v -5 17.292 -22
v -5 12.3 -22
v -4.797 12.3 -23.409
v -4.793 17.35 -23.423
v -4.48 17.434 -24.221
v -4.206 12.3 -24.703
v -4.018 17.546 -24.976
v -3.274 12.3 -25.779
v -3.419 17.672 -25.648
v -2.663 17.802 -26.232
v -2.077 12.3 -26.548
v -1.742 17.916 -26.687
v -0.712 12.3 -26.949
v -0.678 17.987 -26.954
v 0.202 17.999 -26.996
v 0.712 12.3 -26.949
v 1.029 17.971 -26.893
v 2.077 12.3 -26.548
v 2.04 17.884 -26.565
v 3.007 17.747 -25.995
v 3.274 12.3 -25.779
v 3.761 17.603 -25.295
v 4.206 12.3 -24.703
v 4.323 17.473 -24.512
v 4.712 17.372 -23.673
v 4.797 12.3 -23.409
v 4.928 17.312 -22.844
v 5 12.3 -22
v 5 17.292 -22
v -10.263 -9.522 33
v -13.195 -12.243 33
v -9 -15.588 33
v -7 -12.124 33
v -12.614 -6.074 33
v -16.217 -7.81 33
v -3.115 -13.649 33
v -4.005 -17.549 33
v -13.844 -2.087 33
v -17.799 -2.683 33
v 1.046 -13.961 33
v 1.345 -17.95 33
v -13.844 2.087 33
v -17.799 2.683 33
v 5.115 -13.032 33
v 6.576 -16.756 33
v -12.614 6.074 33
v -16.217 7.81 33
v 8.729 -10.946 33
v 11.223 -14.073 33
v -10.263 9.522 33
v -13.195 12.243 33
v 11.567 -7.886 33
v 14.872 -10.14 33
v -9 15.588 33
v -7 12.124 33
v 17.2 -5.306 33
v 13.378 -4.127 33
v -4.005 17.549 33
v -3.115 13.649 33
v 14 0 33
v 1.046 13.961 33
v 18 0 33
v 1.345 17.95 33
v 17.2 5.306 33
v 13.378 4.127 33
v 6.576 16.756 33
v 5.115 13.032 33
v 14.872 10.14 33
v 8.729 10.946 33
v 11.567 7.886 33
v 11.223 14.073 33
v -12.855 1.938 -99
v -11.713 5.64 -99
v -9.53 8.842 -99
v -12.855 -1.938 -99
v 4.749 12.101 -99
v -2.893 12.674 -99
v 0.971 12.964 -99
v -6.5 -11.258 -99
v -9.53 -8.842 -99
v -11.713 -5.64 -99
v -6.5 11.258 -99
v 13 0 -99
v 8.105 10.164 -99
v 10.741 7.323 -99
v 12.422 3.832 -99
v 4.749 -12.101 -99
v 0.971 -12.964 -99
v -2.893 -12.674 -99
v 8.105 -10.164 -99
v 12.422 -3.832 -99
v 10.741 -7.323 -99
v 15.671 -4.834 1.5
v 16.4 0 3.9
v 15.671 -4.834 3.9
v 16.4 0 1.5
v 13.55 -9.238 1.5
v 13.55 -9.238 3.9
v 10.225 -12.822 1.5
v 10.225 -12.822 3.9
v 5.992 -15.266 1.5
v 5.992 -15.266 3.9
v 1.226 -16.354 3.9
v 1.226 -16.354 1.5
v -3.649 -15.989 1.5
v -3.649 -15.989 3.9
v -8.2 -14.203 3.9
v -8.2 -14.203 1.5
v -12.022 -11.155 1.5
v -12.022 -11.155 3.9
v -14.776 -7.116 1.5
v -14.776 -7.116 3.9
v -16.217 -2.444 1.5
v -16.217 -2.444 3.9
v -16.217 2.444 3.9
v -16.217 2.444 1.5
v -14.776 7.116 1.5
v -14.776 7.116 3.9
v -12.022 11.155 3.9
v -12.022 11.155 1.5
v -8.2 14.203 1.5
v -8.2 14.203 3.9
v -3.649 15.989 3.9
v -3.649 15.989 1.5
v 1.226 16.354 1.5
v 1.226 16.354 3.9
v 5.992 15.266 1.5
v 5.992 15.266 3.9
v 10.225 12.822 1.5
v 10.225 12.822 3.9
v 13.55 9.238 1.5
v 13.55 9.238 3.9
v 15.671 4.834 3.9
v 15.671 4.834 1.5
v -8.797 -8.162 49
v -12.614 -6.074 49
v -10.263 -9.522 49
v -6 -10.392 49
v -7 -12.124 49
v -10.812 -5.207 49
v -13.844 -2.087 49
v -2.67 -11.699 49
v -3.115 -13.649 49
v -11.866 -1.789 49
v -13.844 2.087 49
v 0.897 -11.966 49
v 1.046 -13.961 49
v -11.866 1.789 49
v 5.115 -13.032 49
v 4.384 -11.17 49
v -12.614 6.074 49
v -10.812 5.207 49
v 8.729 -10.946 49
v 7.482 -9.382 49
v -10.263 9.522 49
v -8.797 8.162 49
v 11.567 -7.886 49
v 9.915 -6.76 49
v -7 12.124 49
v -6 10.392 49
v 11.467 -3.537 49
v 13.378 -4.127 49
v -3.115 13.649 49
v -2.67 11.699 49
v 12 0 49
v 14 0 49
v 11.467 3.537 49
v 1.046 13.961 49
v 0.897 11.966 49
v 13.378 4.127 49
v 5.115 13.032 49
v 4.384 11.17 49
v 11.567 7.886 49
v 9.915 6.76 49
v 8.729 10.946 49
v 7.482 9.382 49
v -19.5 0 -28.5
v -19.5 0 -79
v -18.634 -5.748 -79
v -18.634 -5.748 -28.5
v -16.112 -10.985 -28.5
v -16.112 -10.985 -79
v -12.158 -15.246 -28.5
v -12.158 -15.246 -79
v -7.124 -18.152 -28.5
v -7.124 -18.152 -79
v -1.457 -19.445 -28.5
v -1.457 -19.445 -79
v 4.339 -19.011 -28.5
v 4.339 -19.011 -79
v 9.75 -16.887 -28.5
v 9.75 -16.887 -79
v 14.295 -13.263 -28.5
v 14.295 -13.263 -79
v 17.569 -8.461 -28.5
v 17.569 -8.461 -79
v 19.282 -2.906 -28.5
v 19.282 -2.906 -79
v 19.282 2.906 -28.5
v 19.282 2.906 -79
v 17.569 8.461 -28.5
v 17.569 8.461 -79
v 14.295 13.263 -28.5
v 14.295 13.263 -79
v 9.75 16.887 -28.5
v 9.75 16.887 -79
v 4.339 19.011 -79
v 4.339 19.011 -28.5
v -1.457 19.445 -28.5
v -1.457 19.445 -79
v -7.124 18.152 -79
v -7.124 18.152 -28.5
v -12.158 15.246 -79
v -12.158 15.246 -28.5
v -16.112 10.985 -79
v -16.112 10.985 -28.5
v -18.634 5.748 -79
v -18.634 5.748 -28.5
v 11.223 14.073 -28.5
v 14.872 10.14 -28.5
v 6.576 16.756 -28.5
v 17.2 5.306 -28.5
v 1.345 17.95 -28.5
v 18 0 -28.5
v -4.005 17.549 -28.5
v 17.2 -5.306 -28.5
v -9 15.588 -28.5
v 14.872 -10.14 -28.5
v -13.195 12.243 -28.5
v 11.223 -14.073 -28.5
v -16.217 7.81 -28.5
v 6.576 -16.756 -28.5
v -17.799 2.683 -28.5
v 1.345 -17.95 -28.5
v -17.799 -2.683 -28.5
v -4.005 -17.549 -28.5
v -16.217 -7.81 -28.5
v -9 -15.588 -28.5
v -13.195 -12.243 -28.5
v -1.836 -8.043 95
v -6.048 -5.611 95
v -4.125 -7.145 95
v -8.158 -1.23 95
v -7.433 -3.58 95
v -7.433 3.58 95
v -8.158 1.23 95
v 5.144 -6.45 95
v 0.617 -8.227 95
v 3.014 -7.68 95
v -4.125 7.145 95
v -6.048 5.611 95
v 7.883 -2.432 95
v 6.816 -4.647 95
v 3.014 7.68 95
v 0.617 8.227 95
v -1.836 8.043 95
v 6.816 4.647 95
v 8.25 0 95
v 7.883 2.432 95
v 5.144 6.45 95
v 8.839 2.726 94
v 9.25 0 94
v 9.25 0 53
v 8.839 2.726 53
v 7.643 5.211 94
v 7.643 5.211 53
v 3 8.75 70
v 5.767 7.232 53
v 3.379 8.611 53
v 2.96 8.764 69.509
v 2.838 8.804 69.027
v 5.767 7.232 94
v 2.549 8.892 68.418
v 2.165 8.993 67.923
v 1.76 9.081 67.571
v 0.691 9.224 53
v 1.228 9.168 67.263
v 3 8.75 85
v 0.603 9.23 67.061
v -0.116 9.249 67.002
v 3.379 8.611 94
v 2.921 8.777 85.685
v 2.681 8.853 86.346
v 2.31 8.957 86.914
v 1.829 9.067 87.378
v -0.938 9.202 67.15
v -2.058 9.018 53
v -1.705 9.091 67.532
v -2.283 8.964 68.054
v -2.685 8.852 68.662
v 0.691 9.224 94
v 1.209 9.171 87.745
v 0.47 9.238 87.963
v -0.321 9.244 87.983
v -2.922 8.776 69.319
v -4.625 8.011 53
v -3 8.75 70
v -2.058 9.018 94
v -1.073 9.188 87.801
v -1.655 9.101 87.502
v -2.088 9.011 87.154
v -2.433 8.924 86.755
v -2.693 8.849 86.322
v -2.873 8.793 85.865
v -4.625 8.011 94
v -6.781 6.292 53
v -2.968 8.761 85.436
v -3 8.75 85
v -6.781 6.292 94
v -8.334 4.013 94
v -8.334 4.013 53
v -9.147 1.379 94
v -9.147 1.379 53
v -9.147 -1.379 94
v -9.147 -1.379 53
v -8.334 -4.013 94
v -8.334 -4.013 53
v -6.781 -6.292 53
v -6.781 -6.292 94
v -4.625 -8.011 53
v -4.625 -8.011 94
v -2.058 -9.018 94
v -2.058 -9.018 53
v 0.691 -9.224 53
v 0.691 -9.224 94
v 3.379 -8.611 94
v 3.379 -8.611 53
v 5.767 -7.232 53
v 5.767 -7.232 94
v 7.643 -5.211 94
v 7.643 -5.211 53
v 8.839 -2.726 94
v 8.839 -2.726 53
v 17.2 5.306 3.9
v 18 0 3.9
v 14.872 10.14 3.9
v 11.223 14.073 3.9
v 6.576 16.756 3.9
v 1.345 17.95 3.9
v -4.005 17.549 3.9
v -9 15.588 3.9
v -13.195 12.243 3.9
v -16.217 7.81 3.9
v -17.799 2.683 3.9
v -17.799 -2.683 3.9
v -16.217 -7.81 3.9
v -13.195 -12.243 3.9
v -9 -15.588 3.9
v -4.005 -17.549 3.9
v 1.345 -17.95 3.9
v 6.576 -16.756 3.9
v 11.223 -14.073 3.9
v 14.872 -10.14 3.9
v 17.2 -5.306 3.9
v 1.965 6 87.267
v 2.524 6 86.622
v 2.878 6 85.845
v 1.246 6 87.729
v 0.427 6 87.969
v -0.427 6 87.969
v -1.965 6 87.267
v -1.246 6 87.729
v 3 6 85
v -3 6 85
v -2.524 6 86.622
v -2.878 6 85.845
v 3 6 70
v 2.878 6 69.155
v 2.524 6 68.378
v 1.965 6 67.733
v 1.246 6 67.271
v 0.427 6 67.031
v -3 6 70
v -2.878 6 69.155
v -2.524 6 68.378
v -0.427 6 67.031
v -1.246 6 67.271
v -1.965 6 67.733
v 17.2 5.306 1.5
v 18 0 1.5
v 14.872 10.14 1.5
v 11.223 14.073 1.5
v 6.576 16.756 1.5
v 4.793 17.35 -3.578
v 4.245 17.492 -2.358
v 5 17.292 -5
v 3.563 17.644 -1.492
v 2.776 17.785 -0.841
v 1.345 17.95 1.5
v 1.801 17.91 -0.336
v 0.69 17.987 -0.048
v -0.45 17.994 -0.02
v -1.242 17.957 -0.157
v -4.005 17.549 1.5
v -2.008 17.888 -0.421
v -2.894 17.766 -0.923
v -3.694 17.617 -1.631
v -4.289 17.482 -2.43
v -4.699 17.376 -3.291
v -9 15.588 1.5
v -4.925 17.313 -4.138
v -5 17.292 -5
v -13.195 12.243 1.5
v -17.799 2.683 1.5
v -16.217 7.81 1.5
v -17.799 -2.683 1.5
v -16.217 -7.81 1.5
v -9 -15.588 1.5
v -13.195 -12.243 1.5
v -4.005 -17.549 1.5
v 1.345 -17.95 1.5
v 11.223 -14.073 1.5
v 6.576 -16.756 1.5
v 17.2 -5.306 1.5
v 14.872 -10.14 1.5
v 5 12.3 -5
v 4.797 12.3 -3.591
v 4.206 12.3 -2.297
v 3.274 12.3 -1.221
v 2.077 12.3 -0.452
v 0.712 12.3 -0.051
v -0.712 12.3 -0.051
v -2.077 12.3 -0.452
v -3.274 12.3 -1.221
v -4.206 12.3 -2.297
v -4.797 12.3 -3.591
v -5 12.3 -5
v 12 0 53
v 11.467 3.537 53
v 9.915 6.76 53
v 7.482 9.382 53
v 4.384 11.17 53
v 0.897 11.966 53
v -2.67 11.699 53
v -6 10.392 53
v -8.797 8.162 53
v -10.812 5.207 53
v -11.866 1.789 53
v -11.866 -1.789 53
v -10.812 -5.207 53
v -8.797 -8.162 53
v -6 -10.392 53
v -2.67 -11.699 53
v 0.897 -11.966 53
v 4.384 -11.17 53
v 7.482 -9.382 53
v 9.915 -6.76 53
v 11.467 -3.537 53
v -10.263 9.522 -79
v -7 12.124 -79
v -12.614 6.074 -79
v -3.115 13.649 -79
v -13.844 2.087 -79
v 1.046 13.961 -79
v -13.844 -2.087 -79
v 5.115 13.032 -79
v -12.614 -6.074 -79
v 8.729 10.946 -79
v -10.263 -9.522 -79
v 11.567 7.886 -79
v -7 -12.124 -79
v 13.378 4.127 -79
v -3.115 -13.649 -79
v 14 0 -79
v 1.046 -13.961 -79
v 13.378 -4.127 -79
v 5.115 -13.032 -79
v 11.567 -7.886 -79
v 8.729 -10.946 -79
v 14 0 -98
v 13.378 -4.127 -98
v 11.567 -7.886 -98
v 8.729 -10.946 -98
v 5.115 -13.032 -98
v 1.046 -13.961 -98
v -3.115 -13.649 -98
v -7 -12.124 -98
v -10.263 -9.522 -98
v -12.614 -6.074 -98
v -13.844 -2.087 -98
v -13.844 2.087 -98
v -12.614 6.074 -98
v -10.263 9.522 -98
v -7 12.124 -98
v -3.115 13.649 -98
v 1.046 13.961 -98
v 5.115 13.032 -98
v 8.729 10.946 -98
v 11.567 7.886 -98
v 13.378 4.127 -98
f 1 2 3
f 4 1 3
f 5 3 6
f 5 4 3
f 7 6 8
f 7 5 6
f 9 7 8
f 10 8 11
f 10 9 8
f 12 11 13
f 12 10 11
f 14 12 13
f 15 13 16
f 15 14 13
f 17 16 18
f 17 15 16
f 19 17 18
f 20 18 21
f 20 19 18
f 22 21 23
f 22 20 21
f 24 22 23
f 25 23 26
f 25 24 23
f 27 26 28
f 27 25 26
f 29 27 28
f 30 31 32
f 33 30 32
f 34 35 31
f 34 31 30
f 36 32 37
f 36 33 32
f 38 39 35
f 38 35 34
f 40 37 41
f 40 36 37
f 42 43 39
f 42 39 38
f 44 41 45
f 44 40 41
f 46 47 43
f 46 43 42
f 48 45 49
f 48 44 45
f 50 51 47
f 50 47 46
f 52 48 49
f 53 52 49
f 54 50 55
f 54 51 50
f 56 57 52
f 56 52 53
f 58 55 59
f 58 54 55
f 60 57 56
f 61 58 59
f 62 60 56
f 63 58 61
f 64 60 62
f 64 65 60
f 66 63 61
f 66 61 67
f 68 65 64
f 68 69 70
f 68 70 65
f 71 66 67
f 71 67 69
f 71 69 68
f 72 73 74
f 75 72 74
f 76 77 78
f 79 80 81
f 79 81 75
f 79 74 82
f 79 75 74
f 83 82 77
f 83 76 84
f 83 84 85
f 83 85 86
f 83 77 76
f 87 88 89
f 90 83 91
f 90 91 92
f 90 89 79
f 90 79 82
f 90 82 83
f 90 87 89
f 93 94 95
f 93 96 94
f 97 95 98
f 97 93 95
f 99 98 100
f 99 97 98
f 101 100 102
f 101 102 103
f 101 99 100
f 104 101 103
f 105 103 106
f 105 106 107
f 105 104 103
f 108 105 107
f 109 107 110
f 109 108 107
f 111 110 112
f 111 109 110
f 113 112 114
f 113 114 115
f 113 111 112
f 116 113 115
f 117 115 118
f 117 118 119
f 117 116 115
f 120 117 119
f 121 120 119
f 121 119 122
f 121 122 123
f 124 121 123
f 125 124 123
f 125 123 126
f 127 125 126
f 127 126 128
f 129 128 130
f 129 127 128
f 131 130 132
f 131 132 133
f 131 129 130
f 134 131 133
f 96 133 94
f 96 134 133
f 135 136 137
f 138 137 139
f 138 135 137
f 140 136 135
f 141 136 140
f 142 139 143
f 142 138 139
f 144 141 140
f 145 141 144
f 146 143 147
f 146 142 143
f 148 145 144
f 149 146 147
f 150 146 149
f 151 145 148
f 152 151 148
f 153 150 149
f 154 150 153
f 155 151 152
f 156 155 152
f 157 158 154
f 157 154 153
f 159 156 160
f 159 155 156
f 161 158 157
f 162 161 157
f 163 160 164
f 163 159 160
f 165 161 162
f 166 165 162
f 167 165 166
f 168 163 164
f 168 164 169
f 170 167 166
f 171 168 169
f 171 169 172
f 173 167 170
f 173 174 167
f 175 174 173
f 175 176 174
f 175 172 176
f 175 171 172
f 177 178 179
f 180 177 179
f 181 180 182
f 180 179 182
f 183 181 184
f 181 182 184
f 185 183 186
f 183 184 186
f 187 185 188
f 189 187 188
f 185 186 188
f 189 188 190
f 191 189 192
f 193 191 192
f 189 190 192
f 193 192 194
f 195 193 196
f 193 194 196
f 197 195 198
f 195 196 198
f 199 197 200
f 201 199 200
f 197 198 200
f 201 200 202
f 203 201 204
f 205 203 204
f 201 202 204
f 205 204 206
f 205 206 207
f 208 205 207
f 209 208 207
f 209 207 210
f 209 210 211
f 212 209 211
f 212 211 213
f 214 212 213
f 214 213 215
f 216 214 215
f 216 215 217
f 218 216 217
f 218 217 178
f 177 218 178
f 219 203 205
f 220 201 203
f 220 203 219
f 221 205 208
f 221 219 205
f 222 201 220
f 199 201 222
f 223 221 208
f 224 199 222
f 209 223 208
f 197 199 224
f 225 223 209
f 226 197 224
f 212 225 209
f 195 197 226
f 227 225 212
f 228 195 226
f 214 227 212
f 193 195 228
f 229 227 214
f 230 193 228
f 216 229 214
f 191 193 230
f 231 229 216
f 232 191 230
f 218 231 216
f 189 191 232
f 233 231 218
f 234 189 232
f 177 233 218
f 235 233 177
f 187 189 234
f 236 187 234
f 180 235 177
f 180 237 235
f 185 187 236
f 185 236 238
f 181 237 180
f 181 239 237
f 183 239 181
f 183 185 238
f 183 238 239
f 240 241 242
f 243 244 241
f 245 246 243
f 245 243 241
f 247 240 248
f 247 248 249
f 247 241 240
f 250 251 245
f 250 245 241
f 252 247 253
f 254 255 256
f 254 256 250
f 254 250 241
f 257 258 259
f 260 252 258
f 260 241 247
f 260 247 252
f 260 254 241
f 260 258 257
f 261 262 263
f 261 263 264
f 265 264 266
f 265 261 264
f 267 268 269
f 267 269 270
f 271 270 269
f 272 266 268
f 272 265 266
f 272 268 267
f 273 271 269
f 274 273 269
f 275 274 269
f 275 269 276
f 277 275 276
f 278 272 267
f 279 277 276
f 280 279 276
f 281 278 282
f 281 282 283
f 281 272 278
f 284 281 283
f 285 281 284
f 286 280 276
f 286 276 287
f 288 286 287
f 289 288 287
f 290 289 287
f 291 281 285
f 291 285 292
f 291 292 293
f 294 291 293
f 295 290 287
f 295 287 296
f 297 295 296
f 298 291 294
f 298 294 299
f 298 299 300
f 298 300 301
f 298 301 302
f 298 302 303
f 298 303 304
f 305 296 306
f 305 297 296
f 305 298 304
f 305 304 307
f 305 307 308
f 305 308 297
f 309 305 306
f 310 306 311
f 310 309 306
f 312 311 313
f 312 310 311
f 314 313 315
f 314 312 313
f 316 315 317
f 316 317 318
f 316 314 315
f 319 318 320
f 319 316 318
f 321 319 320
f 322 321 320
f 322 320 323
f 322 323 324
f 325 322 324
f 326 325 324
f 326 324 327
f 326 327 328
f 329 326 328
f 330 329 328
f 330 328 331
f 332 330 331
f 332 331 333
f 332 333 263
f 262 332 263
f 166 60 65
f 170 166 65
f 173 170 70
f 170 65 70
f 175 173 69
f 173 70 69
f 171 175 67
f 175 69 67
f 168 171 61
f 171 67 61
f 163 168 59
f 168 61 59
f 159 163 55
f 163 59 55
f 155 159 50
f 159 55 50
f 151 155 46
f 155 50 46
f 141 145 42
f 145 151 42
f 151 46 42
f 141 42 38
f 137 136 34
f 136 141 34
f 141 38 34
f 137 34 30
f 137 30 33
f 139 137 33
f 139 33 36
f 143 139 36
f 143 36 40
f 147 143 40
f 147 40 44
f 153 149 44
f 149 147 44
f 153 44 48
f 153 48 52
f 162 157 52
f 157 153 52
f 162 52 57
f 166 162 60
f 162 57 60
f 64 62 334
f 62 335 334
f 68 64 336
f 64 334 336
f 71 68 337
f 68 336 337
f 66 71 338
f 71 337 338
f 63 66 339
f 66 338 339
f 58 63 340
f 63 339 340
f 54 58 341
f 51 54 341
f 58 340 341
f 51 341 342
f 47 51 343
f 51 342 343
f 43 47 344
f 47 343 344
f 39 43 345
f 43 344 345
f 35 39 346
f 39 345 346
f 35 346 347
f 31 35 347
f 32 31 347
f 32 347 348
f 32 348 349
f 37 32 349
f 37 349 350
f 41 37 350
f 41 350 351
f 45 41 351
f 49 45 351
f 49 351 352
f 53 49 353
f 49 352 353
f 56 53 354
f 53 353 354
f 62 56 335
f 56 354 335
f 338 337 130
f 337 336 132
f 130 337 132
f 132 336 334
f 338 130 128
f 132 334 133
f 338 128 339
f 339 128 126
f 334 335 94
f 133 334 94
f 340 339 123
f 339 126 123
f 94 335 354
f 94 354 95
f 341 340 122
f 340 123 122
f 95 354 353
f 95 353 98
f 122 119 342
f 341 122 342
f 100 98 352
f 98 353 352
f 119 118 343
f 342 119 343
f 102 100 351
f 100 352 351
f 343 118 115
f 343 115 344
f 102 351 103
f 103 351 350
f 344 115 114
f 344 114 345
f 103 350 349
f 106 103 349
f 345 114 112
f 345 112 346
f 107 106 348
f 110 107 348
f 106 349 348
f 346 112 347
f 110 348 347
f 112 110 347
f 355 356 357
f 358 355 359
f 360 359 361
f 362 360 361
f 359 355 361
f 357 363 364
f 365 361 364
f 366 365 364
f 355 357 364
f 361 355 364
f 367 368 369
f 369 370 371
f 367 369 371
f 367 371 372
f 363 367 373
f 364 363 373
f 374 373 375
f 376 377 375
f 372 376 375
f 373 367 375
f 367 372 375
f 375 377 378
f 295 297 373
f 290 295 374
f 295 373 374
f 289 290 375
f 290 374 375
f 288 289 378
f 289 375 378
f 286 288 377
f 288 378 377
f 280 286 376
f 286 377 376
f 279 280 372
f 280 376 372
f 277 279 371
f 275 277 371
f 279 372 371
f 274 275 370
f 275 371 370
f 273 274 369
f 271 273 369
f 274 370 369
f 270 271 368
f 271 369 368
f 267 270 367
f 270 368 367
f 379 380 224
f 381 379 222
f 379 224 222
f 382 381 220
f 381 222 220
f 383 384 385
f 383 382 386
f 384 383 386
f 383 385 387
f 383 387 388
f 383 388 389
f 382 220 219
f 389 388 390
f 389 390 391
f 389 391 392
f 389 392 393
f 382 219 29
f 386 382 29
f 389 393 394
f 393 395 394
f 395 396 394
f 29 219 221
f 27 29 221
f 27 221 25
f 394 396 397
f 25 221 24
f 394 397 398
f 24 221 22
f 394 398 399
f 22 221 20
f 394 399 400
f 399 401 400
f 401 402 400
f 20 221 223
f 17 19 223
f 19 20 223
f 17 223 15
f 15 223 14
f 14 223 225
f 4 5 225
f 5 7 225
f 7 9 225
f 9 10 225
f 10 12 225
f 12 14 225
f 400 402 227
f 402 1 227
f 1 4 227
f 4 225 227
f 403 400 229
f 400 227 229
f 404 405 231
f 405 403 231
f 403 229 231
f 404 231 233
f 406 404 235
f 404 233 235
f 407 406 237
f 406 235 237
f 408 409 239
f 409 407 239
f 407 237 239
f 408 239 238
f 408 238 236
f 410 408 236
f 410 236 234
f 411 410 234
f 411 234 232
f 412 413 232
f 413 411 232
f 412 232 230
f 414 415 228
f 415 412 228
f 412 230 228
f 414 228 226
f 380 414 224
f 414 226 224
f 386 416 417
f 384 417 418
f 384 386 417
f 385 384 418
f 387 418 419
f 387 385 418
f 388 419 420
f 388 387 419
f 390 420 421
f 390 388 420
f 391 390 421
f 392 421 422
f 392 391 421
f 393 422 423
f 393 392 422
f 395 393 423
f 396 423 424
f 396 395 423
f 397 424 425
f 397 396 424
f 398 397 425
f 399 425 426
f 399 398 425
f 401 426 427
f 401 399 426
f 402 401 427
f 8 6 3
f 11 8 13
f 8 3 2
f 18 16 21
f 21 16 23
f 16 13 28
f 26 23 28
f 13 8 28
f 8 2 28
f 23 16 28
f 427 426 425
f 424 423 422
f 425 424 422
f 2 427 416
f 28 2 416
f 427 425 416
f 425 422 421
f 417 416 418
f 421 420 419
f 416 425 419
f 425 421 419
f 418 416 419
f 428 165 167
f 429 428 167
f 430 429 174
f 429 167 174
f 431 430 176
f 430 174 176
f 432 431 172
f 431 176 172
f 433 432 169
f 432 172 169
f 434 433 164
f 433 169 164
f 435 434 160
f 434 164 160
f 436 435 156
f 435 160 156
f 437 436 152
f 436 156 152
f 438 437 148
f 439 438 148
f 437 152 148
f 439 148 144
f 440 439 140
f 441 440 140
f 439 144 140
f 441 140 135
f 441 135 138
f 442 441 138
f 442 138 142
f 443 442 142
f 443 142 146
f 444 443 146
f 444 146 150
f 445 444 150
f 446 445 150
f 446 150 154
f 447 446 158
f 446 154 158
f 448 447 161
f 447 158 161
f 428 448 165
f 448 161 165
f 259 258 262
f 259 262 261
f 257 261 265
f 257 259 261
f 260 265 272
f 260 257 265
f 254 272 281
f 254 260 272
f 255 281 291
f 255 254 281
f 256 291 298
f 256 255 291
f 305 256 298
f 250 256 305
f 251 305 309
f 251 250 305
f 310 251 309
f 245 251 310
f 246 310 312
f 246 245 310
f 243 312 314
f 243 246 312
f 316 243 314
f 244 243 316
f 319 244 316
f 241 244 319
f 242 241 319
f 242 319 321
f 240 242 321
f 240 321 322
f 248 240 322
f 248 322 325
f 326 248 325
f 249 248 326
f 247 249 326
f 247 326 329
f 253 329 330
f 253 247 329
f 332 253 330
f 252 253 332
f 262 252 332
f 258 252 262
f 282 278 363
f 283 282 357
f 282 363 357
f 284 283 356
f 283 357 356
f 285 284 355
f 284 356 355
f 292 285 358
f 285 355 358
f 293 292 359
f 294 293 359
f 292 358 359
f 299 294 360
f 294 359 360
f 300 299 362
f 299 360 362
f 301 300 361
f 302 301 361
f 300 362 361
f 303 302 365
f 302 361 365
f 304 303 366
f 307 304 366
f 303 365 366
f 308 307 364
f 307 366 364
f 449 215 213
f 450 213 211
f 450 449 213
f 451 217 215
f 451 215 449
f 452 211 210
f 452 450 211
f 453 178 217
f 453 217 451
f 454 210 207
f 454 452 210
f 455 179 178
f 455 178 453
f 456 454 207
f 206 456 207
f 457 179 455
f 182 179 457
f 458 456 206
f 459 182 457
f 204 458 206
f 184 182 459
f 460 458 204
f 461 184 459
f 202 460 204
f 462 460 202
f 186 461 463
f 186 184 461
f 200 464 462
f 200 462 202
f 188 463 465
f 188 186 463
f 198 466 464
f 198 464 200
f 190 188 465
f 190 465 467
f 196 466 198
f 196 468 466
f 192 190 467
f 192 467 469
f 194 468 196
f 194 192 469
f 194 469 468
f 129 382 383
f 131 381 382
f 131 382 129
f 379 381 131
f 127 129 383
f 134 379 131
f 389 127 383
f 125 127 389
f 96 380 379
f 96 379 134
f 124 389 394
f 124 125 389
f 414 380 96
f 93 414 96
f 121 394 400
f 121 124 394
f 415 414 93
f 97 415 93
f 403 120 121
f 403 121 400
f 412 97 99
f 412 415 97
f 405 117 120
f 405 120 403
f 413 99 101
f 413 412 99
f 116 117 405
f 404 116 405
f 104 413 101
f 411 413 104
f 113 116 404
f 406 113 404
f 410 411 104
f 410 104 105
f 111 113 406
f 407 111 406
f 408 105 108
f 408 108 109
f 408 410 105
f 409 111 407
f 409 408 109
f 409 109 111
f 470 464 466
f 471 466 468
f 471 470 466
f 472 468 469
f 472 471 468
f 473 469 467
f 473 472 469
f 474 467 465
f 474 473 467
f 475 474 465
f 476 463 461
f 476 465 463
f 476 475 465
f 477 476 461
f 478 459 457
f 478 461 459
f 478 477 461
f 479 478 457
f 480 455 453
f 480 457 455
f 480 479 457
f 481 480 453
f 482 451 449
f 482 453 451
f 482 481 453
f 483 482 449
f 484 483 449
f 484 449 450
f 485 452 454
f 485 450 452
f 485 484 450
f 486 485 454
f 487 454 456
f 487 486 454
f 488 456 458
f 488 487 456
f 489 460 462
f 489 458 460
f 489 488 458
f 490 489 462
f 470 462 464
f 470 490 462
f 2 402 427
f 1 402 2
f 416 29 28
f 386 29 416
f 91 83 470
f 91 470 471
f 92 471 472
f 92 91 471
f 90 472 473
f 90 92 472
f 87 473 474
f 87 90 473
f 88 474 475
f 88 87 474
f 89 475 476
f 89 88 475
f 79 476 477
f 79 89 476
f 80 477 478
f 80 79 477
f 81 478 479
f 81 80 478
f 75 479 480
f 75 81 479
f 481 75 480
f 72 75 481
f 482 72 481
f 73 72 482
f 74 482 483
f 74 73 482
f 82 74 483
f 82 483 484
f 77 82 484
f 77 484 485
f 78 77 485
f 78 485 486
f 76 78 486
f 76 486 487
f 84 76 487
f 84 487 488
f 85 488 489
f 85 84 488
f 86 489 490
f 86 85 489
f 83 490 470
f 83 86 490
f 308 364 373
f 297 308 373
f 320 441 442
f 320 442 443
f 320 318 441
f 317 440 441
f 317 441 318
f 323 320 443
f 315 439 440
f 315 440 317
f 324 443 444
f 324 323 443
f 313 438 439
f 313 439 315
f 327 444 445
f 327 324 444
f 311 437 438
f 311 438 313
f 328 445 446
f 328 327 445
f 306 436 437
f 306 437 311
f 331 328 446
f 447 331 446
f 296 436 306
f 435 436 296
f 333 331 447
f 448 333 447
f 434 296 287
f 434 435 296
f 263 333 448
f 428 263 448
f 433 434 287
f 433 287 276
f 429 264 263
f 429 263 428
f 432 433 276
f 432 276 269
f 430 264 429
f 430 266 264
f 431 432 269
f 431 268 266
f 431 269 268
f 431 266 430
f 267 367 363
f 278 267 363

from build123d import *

# Parameters (mm, degrees)
BOSS_EXTRUDE1_DEPTH      = 5
BOSS_EXTRUDE1_DEPTH_BACK = 34
SKETCH1_R                = 18
SKETCH2_R                = 14
BOSS_EXTRUDE2_DEPTH      = 50
BOSS_EXTRUDE3_START      = 80
SKETCH3_R                = 14
BOSS_EXTRUDE3_DEPTH      = 80
CUT_EXTRUDE2_DEPTH       = 9
SKETCH6_R                = 19.5
SKETCH6_R_2              = 18
BOSS_EXTRUDE4_DEPTH      = 4
SKETCH10_R               = 19.5
SKETCH10_R_2             = 18
BOSS_EXTRUDE6_DEPTH      = 1.5
SKETCH12_W               = 2.4
SKETCH12_H               = 5.371583629
SKETCH13_R               = 18
BOSS_EXTRUDE7_DEPTH      = 2
SKETCH14_W               = 5.5
SKETCH14_H               = 45
SKETCH17_R               = 14.891727411
CUT_EXTRUDE4_DEPTH       = 18
BOSS_EXTRUDE8_START      = 3
SKETCH18_R               = 14
BOSS_EXTRUDE8_DEPTH      = 3
SKETCH19_R               = 18
BOSS_EXTRUDE9_DEPTH      = 26
SKETCH20_R               = 17.17468577
SKETCH20_R_2             = 9.25
CUT_EXTRUDE5_DEPTH       = 6
BOSS_EXTRUDE10_START     = 40
SKETCH21_R               = 9.25
BOSS_EXTRUDE10_DEPTH     = 40
SKETCH22_R               = 12
BOSS_EXTRUDE11_DEPTH     = 4
CHAMFER1_SIZE            = 1
CUT_EXTRUDE6_DEPTH       = 10


with BuildPart() as part:
    # Sketch1 → Boss-Extrude1 (new, two sides: drawn at the far end of the back side and taken through both)
    with BuildSketch(Plane.XY.offset(-BOSS_EXTRUDE1_DEPTH_BACK)):
        Circle(SKETCH1_R)
    extrude(amount=BOSS_EXTRUDE1_DEPTH + BOSS_EXTRUDE1_DEPTH_BACK)

    # Sketch2 → Boss-Extrude2 (add)
    with BuildSketch(Plane.XY.offset(5)):
        Circle(SKETCH2_R)
    extrude(amount=BOSS_EXTRUDE2_DEPTH)

    # Sketch3 → Boss-Extrude3 (add)
    with BuildSketch(Plane(origin=(0, 0, -34), x_dir=(-1, 0, 0), z_dir=(0, 0, -1)).offset(BOSS_EXTRUDE3_START)):
        with Locations(Location((0, 0, 0), (0, 0, 180))):
            Circle(SKETCH3_R)
    extrude(amount=-BOSS_EXTRUDE3_DEPTH)

    # Sketch5 → Cut-Extrude2 (cut)
    with BuildSketch(Plane.XZ.offset(-21.3)):
        with BuildLine():
            Line((-5, -5), (-5, -22))
            ThreePointArc((-5, -22), (0, -27), (5, -22))
            Line((5, -22), (5, -5))
            ThreePointArc((5, -5), (0, 0), (-5, -5))
        make_face()
    extrude(amount=CUT_EXTRUDE2_DEPTH, mode=Mode.SUBTRACT)

    # Sketch6 → Boss-Extrude4 (add)
    with BuildSketch(Plane(origin=(0, 0, -34), x_dir=(-1, 0, 0), z_dir=(0, 0, -1))):
        Circle(SKETCH6_R)
        with Locations(Location((0, 0, 0), (0, 0, 270))):
            Circle(SKETCH6_R_2, mode=Mode.SUBTRACT)
    extrude(amount=-BOSS_EXTRUDE4_DEPTH)

    # Sketch10 → Boss-Extrude6 (add)
    with BuildSketch(Plane.XY.offset(-30)):
        with Locations(Location((0, 0, 0), (0, 0, 180))):
            Circle(SKETCH10_R)
        Circle(SKETCH10_R_2, mode=Mode.SUBTRACT)
    extrude(amount=BOSS_EXTRUDE6_DEPTH)

    # Sketch12 → Cut-Revolve1 (revolve, cut)
    with BuildSketch(Plane(origin=(0, 0, 0), x_dir=(0, 0, -1), z_dir=(1, 0, 0)), mode=Mode.PRIVATE) as cut_revolve1_sk:
        with Locations((-2.7, 19.085791815)):
            Rectangle(SKETCH12_W, SKETCH12_H)
    revolve(cut_revolve1_sk.sketch.rotate(Axis((0, 0, 1.5), (0, 0, -1)), 90), axis=Axis((0, 0, 1.5), (0, 0, -1)), mode=Mode.SUBTRACT)

    # Sketch13 → Boss-Extrude7 (add)
    with BuildSketch(Plane.XY.offset(5)):
        Circle(SKETCH13_R)
    extrude(amount=BOSS_EXTRUDE7_DEPTH)

    # Sketch14 → Revolve1 (revolve)
    with BuildSketch(Plane(origin=(0, 0, 0), x_dir=(1, 0, 0), z_dir=(0, 1, 0)), mode=Mode.PRIVATE) as revolve1_sk:
        with Locations((16.75, 56.5)):
            Rectangle(SKETCH14_W, SKETCH14_H)
    revolve(revolve1_sk.sketch.rotate(Axis((0, 0, -114), (0, 0, 1)), 180), axis=Axis((0, 0, -114), (0, 0, 1)))

    # Sketch17 → Cut-Extrude4 (cut)
    with BuildSketch(Plane(origin=(0, 0, -114), x_dir=(-1, 0, 0), z_dir=(0, 0, -1))):
        Circle(SKETCH17_R)
    extrude(amount=-CUT_EXTRUDE4_DEPTH, mode=Mode.SUBTRACT)

    # Sketch18 → Boss-Extrude8 (add)
    with BuildSketch(Plane(origin=(0, 0, -96), x_dir=(-1, 0, 0), z_dir=(0, 0, -1)).offset(BOSS_EXTRUDE8_START)):
        with Locations(Location((0, 0, 0), (0, 0, 180))):
            Circle(SKETCH18_R)
    extrude(amount=-BOSS_EXTRUDE8_DEPTH)

    # Sketch19 → Boss-Extrude9 (add)
    with BuildSketch(Plane.XY.offset(7)):
        Circle(SKETCH19_R)
    extrude(amount=BOSS_EXTRUDE9_DEPTH)

    # Sketch20 → Cut-Extrude5 (cut)
    with BuildSketch(Plane.XY.offset(55)):
        Circle(SKETCH20_R)
        Circle(SKETCH20_R_2, mode=Mode.SUBTRACT)
    extrude(amount=-CUT_EXTRUDE5_DEPTH, mode=Mode.SUBTRACT)

    # Sketch21 → Boss-Extrude10 (add)
    with BuildSketch(Plane.XY.offset(55).offset(BOSS_EXTRUDE10_START)):
        Circle(SKETCH21_R)
    extrude(amount=-BOSS_EXTRUDE10_DEPTH)

    # Sketch22 → Boss-Extrude11 (add)
    with BuildSketch(Plane.XY.offset(49)):
        Circle(SKETCH22_R)
    extrude(amount=BOSS_EXTRUDE11_DEPTH)

    # Chamfer1
    chamfer1_edges = [part.edges().sort_by_distance(p)[0] for p in [
        (-14, 0, -99),
        (-9.25, 0, 95),
    ]]
    chamfer(chamfer1_edges, length=CHAMFER1_SIZE)

    # Sketch24 → Cut-Extrude6 (cut)
    with BuildSketch(Plane(origin=(0, 6, 0), x_dir=(1, 0, 0), z_dir=(0, 1, 0))):
        with BuildLine():
            Line((3, -70), (3, -85))
            ThreePointArc((3, -85), (0, -88), (-3, -85))
            Line((-3, -85), (-3, -70))
            ThreePointArc((-3, -70), (0, -67), (3, -70))
        make_face()
    extrude(amount=CUT_EXTRUDE6_DEPTH, mode=Mode.SUBTRACT)


solid = part.part
